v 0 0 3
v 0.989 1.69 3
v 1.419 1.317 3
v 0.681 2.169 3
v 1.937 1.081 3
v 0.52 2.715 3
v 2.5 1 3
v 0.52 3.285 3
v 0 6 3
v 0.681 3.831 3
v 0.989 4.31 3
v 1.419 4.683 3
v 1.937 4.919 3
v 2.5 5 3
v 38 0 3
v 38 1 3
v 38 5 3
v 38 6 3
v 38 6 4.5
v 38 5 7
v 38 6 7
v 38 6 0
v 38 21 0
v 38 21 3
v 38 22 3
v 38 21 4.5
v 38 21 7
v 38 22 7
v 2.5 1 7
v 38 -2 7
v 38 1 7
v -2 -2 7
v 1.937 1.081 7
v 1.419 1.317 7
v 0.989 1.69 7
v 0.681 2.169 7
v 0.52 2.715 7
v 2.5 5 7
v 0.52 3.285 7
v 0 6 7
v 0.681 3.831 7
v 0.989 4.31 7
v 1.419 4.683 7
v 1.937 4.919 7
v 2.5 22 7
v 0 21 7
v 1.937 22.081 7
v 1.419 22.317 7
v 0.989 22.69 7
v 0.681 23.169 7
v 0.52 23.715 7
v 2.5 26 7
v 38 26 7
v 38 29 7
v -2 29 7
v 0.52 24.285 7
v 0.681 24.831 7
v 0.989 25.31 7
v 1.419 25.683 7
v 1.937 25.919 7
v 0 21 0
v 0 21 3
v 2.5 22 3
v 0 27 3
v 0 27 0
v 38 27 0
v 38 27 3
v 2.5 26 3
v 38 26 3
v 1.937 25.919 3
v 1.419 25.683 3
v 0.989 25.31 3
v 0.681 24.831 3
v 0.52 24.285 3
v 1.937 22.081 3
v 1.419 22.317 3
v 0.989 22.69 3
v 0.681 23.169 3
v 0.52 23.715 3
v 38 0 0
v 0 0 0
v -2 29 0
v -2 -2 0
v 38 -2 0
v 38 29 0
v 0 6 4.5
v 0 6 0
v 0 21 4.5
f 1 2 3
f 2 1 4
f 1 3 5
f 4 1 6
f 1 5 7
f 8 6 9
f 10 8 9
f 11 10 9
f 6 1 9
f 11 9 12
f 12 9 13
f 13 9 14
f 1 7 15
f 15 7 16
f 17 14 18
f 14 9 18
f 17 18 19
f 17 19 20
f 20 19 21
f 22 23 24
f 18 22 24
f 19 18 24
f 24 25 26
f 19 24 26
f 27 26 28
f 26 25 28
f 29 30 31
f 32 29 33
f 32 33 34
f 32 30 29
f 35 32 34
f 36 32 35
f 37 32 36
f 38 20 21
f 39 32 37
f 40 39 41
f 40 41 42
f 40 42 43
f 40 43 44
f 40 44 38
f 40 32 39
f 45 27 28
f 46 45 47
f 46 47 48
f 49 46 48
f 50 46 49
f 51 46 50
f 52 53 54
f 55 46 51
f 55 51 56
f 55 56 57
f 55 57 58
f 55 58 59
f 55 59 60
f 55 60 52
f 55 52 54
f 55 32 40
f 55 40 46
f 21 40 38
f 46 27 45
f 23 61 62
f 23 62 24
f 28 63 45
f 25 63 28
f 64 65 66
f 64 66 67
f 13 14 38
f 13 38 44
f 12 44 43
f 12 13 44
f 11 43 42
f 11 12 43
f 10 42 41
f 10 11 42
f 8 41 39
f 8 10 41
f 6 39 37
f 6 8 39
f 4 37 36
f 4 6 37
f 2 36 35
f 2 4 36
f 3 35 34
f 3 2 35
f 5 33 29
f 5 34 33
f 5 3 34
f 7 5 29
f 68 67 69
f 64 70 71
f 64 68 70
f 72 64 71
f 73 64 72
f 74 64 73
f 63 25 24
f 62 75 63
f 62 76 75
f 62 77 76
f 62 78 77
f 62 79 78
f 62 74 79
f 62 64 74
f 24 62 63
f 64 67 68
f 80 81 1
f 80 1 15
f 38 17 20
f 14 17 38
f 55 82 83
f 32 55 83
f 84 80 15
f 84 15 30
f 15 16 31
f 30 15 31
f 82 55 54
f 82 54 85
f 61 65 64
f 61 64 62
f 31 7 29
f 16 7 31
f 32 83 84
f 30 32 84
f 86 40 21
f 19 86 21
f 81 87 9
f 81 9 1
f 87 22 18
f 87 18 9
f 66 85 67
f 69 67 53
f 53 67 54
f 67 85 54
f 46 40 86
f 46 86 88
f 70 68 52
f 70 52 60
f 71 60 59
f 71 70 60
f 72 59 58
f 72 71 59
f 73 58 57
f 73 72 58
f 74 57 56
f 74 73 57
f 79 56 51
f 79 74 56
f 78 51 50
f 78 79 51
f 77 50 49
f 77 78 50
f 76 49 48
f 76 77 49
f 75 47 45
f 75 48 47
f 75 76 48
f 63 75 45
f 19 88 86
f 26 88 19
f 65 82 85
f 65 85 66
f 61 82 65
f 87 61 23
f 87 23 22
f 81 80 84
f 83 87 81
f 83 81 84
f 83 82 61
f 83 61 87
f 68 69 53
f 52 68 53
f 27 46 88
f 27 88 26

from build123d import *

# Parameters (mm, degrees)
SKETCH1_W             = 25
SKETCH1_H             = 31
IMU_BASE_DEPTH        = 7
SCREW_CHANNELS_DEPTH  = 14
NUT_CHANNELS_DEPTH    = 3
SKETCH2_W             = 23
SKETCH2_H             = 15
SOLDER_CHANNELS_DEPTH = 2.5
IMU_EXTENSION_DEPTH   = 15


with BuildPart() as part:
    # Sketch1 → IMU_Base (new body)
    with BuildSketch(Plane.XY):
        with Locations((10.5, 13.5)):
            Rectangle(SKETCH1_W, SKETCH1_H)
    extrude(amount=IMU_BASE_DEPTH)

    # Sketch1<12> → Screw_Channels (cut)
    with BuildSketch(Plane.XY):
        with BuildLine():
            ThreePointArc((2.5, 5), (0.5, 3), (2.5, 1))
            Line((2.5, 1), (23, 1))
            Line((23, 1), (23, 5))
            Line((23, 5), (2.5, 5))
        make_face()
        with BuildLine():
            Line((23, 22), (23, 26))
            Line((23, 26), (2.5, 26))
            ThreePointArc((2.5, 26), (0.5, 24), (2.5, 22))
            Line((2.5, 22), (23, 22))
        make_face()
    extrude(amount=SCREW_CHANNELS_DEPTH, mode=Mode.SUBTRACT)

    # Sketch1<13> → Nut_Channels (cut)
    with BuildSketch(Plane.XY):
        with BuildLine():
            Line((0, 0), (23, 0))
            Line((23, 0), (23, 1))
            Line((23, 1), (2.5, 1))
            ThreePointArc((2.5, 1), (0.5, 3), (2.5, 5))
            Line((2.5, 5), (23, 5))
            Line((23, 5), (23, 6))
            Line((23, 6), (0, 6))
            Line((0, 6), (0, 0))
        make_face()
        with BuildLine():
            Line((0, 21), (23, 21))
            Line((23, 21), (23, 22))
            Line((23, 22), (2.5, 22))
            ThreePointArc((2.5, 22), (0.5, 24), (2.5, 26))
            Line((2.5, 26), (23, 26))
            Line((23, 26), (23, 27))
            Line((23, 27), (0, 27))
            Line((0, 27), (0, 21))
        make_face()
    extrude(amount=NUT_CHANNELS_DEPTH, mode=Mode.SUBTRACT)

    # Sketch2 → Solder_Channels (cut)
    with BuildSketch(Plane.XY.offset(7)):
        with Locations((11.5, 13.5)):
            Rectangle(SKETCH2_W, SKETCH2_H)
    extrude(amount=-SOLDER_CHANNELS_DEPTH, mode=Mode.SUBTRACT)

    # Sketch4 → IMU_Extension (add)
    with BuildSketch(Plane(origin=(23, 0, 0), x_dir=(0, 0, -1), z_dir=(1, 0, 0))):
        Polygon((-7, 26), (-7, 29), (0, 29), (0, 27), (-3, 27), (-3, 26), align=None)
        Polygon((-7, 22), (-3, 22), (-3, 21), (0, 21), (0, 6), (-3, 6), (-3, 5), (-7, 5), (-7, 6), (-4.5, 6), (-4.5, 21), (-7, 21), align=None)
        Polygon((-7, 1), (-3, 1), (-3, 0), (0, 0), (0, -2), (-7, -2), align=None)
    extrude(amount=IMU_EXTENSION_DEPTH)


solid = part.part
